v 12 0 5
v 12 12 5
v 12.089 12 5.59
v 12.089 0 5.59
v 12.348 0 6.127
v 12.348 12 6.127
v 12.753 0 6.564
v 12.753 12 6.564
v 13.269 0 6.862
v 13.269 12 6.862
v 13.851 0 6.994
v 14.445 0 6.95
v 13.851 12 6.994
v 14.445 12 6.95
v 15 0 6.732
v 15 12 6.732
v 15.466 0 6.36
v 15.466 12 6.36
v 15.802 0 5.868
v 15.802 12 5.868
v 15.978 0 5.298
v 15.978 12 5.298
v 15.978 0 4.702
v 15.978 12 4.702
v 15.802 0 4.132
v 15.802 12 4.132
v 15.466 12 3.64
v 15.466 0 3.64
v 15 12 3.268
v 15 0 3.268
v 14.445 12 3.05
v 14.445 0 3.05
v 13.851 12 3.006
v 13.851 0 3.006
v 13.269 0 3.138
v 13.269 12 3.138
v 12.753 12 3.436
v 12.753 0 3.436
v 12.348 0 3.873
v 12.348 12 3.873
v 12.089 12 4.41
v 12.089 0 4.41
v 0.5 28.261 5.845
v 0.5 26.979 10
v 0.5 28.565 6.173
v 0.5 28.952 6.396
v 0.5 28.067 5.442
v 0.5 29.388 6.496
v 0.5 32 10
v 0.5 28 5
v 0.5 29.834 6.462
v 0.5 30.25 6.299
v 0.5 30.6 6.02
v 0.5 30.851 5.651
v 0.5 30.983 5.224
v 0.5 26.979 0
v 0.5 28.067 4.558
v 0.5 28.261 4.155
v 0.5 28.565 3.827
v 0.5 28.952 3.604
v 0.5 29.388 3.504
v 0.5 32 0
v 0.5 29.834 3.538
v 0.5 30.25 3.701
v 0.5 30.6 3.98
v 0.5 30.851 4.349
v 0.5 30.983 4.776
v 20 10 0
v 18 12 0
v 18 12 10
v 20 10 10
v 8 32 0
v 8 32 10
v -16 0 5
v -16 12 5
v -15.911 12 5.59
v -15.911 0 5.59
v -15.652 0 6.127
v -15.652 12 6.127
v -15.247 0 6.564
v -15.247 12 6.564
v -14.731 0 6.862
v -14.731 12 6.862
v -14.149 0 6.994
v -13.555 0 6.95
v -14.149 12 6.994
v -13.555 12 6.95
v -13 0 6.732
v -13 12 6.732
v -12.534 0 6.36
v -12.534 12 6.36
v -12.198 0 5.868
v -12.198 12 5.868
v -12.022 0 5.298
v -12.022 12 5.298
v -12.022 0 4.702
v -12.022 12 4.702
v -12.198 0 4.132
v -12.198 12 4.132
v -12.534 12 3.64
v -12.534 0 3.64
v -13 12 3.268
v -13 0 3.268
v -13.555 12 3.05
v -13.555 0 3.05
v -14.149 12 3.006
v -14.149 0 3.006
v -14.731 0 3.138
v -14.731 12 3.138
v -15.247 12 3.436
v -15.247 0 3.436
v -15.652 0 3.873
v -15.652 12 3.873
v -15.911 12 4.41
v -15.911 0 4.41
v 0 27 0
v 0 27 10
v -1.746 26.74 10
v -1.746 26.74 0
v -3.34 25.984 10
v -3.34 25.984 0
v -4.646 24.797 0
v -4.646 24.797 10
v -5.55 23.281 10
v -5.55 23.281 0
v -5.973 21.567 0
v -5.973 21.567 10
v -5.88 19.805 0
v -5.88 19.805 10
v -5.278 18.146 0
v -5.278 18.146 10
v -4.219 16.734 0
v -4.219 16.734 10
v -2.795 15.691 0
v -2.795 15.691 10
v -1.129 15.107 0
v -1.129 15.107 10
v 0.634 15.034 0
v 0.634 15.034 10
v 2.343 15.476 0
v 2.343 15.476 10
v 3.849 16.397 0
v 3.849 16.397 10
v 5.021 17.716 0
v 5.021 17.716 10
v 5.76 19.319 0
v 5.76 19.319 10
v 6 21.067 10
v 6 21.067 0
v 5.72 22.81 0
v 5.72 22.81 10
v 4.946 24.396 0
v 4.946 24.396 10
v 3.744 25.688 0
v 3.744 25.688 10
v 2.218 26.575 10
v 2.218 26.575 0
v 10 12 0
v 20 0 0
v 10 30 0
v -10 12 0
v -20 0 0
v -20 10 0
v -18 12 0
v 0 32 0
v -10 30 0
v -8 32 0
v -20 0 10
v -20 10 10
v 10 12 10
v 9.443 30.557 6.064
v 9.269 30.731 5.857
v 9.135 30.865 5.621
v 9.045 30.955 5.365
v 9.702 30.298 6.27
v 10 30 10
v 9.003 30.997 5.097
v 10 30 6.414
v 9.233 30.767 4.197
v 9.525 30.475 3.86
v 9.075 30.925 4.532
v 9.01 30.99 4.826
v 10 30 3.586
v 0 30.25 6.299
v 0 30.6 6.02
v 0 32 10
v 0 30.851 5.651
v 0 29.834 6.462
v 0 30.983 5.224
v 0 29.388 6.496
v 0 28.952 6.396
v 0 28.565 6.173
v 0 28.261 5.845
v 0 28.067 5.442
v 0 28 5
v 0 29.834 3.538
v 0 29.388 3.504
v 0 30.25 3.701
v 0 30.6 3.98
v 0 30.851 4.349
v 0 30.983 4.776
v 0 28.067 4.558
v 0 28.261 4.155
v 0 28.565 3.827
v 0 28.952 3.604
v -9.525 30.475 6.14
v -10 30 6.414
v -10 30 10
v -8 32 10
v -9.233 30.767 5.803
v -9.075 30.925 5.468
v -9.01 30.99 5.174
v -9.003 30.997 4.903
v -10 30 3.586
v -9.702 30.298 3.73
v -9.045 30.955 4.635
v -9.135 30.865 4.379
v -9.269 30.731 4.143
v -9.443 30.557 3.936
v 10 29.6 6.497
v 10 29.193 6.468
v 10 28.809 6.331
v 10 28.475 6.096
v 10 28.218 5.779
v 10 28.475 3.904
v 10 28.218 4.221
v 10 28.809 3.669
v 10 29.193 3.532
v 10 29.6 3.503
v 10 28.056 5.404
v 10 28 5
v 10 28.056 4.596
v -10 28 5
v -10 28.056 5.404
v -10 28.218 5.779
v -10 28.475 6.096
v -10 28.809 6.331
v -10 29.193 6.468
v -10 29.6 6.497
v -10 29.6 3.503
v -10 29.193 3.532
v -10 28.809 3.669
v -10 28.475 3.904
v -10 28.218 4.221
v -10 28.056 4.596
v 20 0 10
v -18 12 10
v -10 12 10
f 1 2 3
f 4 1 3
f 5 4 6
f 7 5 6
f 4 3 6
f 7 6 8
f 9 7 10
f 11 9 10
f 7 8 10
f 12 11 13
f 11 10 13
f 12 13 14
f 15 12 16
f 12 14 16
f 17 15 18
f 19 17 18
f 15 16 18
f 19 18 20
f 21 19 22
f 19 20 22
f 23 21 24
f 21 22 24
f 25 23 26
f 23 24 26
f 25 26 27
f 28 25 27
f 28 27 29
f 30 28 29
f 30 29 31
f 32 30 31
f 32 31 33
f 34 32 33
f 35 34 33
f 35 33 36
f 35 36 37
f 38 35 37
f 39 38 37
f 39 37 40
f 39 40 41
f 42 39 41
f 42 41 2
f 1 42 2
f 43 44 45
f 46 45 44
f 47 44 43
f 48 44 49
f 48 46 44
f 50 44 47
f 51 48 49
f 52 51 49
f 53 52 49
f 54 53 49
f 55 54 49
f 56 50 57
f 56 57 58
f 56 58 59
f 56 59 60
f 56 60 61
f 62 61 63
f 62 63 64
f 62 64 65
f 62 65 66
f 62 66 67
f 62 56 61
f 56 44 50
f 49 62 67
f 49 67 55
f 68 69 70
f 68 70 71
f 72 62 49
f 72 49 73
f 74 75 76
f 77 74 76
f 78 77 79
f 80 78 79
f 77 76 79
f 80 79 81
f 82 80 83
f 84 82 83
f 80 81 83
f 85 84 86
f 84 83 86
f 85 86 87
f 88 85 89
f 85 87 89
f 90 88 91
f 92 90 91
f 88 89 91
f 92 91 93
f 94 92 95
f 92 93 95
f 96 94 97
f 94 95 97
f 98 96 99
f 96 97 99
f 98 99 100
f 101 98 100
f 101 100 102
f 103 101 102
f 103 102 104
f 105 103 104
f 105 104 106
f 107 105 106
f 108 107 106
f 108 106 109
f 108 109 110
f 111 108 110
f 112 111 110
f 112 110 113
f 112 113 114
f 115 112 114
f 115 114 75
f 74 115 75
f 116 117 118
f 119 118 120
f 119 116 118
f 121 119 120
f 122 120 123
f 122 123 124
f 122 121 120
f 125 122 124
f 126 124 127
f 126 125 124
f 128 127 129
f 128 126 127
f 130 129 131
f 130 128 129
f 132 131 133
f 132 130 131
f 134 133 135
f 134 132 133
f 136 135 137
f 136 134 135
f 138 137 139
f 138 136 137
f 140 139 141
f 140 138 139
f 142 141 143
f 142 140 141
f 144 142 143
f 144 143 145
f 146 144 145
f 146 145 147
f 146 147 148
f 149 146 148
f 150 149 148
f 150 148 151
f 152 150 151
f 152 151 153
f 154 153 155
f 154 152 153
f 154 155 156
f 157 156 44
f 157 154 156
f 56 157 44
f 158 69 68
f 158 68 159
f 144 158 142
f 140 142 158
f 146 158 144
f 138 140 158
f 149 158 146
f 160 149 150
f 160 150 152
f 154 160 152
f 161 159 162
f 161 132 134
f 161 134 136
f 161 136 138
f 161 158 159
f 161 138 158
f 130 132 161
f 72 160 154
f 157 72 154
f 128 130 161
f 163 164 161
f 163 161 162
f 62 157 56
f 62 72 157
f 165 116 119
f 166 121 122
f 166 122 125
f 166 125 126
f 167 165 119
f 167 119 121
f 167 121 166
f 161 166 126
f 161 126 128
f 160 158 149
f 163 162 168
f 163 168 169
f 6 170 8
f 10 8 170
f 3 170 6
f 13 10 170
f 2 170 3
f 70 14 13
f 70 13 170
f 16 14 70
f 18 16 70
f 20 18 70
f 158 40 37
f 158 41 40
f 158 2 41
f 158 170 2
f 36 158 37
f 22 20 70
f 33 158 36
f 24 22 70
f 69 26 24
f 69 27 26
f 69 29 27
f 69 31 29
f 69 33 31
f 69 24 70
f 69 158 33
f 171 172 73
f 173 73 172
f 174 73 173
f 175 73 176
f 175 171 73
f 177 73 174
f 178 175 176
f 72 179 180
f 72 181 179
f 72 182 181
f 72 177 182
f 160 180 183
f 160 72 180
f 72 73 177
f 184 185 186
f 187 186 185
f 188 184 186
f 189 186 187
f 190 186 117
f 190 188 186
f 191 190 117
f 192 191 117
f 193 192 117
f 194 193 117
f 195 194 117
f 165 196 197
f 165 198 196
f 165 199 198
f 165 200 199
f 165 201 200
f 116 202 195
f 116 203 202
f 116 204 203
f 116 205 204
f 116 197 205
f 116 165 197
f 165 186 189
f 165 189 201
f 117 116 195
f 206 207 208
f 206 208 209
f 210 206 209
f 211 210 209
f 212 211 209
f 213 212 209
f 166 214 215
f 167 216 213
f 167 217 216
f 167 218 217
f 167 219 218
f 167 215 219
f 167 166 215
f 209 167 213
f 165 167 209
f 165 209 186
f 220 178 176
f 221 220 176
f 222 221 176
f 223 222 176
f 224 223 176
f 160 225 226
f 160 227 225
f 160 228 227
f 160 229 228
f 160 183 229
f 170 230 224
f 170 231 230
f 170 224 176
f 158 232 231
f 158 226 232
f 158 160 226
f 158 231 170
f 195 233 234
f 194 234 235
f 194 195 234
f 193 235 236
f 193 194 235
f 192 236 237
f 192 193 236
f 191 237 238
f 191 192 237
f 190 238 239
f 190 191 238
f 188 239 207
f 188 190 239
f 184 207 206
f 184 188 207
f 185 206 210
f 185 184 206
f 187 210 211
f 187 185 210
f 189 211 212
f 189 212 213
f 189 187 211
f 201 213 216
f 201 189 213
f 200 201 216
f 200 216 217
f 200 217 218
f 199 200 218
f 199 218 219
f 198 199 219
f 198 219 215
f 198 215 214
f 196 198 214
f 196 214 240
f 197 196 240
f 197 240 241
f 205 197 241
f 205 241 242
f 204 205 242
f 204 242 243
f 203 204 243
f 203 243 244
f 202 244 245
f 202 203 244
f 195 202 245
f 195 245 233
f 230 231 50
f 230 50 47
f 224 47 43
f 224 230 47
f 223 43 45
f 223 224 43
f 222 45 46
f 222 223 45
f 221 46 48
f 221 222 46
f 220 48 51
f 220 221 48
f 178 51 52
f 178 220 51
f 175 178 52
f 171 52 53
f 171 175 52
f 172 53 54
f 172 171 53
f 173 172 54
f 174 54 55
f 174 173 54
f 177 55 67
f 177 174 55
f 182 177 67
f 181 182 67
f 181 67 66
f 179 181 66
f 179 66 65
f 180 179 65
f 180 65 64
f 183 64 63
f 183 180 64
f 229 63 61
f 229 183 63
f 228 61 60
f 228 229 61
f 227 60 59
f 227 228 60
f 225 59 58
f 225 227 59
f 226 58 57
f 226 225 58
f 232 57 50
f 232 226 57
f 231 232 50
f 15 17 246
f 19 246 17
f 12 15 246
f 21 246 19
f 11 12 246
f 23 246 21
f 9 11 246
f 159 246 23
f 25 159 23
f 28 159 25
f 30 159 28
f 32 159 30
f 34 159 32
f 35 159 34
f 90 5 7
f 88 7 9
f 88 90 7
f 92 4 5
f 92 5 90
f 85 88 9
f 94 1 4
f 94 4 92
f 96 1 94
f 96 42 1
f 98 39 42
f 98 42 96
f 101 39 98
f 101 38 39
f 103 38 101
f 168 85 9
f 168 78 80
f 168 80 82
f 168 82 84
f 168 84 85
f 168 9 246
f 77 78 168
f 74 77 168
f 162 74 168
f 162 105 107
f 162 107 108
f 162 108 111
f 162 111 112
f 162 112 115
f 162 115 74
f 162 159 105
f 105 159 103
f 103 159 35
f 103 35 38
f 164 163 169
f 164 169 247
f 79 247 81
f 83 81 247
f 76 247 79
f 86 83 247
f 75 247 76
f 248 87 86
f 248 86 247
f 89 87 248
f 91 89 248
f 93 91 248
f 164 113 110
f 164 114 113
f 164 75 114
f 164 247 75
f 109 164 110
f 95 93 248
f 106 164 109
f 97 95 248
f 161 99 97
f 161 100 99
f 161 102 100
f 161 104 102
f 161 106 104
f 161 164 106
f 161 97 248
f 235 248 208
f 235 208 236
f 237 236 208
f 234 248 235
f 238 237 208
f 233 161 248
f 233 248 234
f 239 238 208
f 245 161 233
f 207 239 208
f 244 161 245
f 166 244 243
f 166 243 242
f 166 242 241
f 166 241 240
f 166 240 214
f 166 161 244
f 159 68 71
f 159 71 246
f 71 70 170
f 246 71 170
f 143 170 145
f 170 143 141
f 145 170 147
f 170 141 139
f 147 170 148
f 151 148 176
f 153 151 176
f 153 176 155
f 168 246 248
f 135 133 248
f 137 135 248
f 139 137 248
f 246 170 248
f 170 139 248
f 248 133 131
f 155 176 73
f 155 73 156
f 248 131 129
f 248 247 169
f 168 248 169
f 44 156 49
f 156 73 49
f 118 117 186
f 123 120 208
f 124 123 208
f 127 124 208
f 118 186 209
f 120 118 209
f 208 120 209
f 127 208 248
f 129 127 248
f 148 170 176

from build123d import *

# Parameters (mm, degrees)
BOSS_EXTRUDE1_DEPTH            = 10
CUT_EXTRUDE1_DEPTH             = 45.988887517
CUT_EXTRUDE1_DEPTH_BACK        = 45.988887517
SKETCH2_R                      = 1.5
CUT_EXTRUDE2_REACH             = 32
SKETCH3_R                      = 2
CUT_EXTRUDE2_DIRECTION_2_DEPTH = 31


with BuildPart() as part:
    # Sketch1 → Boss-Extrude1 (new body)
    with BuildSketch(Plane.XY):
        with BuildLine():
            Line((20, 0), (-20, 0))
            Line((-20, 0), (-20, 10))
            Line((-20, 10), (-18, 12))
            Line((-18, 12), (-10, 12))
            Line((-10, 12), (-10, 30))
            Line((-10, 30), (-8, 32))
            Line((-8, 32), (0, 32))
            Line((0, 32), (0, 27))
            ThreePointArc((0, 27), (-0.250217676, 15.005219678), (0.5, 26.979130372))
            Line((0.5, 26.979130372), (0.5, 32))
            Line((0.5, 32), (8, 32))
            Line((8, 32), (10, 30))
            Line((10, 30), (10, 12))
            Line((10, 12), (18, 12))
            Line((18, 12), (20, 10))
            Line((20, 10), (20, 0))
        make_face()
    extrude(amount=BOSS_EXTRUDE1_DEPTH)

    # Sketch2 → Cut-Extrude1 (cut, two sides: drawn at the far end of the back side and taken through both)
    with BuildSketch(Plane.ZY.offset(10).offset(-CUT_EXTRUDE1_DEPTH_BACK)):
        with Locations(Location((5, 29.5, 0), (0, 0, 270))):
            Circle(SKETCH2_R)
    extrude(amount=CUT_EXTRUDE1_DEPTH + CUT_EXTRUDE1_DEPTH_BACK, mode=Mode.SUBTRACT)

    # Sketch3 → Cut-Extrude2 (cut, up to next)
    with BuildSketch(Plane(origin=(0, 12, 0), x_dir=(1, 0, 0), z_dir=(0, 1, 0)), mode=Mode.PRIVATE) as cut_extrude2_sk1:
        with Locations(Location((14, -5, 0), (0, 0, 180))):
            Circle(SKETCH3_R)
    cut_extrude2_tool1 = extrude(cut_extrude2_sk1.sketch, amount=-CUT_EXTRUDE2_REACH, mode=Mode.PRIVATE) & part.part
    # Sketch3 → Cut-Extrude2 (cut, up to next)
    with BuildSketch(Plane(origin=(0, 12, 0), x_dir=(1, 0, 0), z_dir=(0, 1, 0)), mode=Mode.PRIVATE) as cut_extrude2_sk2:
        with Locations(Location((-14, -5, 0), (0, 0, 180))):
            Circle(SKETCH3_R)
    cut_extrude2_tool2 = extrude(cut_extrude2_sk2.sketch, amount=-CUT_EXTRUDE2_REACH, mode=Mode.PRIVATE) & part.part
    add(cut_extrude2_tool1.solids().sort_by_distance((14, 12, 5))[0], mode=Mode.SUBTRACT)
    add(cut_extrude2_tool2.solids().sort_by_distance((-14, 12, 5))[0], mode=Mode.SUBTRACT)

    # Sketch3 → Cut-Extrude2 direction 2 (cut)
    with BuildSketch(Plane(origin=(0, 12, 0), x_dir=(1, 0, 0), z_dir=(0, 1, 0))):
        with Locations(Location((14, -5, 0), (0, 0, 180))):
            Circle(SKETCH3_R)
        with Locations(Location((-14, -5, 0), (0, 0, 180))):
            Circle(SKETCH3_R)
    extrude(amount=CUT_EXTRUDE2_DIRECTION_2_DEPTH, mode=Mode.SUBTRACT)


solid = part.part
